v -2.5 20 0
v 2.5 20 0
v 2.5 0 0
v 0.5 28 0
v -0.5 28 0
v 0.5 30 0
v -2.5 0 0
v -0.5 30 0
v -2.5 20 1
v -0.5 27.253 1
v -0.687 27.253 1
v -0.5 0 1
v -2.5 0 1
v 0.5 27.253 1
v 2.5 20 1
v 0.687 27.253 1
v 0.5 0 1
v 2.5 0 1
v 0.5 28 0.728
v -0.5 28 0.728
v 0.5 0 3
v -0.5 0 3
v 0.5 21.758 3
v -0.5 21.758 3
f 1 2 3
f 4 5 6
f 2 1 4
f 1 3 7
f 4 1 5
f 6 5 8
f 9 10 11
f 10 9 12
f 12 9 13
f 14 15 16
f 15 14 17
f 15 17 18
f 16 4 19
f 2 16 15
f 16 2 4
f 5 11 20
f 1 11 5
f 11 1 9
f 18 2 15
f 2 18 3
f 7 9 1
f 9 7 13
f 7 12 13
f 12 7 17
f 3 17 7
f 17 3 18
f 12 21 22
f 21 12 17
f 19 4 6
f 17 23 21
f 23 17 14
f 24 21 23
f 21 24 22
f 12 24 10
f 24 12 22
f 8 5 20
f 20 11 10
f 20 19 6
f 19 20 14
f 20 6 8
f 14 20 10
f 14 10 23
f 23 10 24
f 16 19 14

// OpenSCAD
OVERALL_LENGTH = 30;
POINT_LENGTH = 10;
POINT_SPINE_ANGLE = 20;

/*
OVERALL_LENGTH = 20;
POINT_LENGTH = 10;
POINT_SPINE_ANGLE = 20;
*/
/*
OVERALL_LENGTH = 10;
POINT_LENGTH = 5;
POINT_SPINE_ANGLE = 30;
*/

WIDTH = 5;
THICKNESS = 1;
SPINE_HEIGHT = 3;
DETAIL = 20;

module point()
{
    linear_extrude(height = THICKNESS, center = false, convexity = 3, twist = 0, slices = DETAIL)
        polygon(points=[[WIDTH / -2, 0],[WIDTH / 2, 0],[0, POINT_LENGTH]]);
}

module body()
{
    union()
    {
        // Point    
        translate(v = [0, OVERALL_LENGTH - POINT_LENGTH, 0])
            point();
        // Main body
        translate(v = [WIDTH / -2, 0, 0])
            cube(size = [WIDTH, OVERALL_LENGTH - POINT_LENGTH, THICKNESS]);
        // Spine
        translate(v = [THICKNESS / -2, 0, 0])
            cube(size = [THICKNESS, OVERALL_LENGTH, SPINE_HEIGHT]);
    }
}

difference()
{
    body();
    translate(v = [-15, OVERALL_LENGTH, 0])
        rotate(a = [90 - POINT_SPINE_ANGLE, 0, 0])
            cube(size = [30, 30, 30]);
}
